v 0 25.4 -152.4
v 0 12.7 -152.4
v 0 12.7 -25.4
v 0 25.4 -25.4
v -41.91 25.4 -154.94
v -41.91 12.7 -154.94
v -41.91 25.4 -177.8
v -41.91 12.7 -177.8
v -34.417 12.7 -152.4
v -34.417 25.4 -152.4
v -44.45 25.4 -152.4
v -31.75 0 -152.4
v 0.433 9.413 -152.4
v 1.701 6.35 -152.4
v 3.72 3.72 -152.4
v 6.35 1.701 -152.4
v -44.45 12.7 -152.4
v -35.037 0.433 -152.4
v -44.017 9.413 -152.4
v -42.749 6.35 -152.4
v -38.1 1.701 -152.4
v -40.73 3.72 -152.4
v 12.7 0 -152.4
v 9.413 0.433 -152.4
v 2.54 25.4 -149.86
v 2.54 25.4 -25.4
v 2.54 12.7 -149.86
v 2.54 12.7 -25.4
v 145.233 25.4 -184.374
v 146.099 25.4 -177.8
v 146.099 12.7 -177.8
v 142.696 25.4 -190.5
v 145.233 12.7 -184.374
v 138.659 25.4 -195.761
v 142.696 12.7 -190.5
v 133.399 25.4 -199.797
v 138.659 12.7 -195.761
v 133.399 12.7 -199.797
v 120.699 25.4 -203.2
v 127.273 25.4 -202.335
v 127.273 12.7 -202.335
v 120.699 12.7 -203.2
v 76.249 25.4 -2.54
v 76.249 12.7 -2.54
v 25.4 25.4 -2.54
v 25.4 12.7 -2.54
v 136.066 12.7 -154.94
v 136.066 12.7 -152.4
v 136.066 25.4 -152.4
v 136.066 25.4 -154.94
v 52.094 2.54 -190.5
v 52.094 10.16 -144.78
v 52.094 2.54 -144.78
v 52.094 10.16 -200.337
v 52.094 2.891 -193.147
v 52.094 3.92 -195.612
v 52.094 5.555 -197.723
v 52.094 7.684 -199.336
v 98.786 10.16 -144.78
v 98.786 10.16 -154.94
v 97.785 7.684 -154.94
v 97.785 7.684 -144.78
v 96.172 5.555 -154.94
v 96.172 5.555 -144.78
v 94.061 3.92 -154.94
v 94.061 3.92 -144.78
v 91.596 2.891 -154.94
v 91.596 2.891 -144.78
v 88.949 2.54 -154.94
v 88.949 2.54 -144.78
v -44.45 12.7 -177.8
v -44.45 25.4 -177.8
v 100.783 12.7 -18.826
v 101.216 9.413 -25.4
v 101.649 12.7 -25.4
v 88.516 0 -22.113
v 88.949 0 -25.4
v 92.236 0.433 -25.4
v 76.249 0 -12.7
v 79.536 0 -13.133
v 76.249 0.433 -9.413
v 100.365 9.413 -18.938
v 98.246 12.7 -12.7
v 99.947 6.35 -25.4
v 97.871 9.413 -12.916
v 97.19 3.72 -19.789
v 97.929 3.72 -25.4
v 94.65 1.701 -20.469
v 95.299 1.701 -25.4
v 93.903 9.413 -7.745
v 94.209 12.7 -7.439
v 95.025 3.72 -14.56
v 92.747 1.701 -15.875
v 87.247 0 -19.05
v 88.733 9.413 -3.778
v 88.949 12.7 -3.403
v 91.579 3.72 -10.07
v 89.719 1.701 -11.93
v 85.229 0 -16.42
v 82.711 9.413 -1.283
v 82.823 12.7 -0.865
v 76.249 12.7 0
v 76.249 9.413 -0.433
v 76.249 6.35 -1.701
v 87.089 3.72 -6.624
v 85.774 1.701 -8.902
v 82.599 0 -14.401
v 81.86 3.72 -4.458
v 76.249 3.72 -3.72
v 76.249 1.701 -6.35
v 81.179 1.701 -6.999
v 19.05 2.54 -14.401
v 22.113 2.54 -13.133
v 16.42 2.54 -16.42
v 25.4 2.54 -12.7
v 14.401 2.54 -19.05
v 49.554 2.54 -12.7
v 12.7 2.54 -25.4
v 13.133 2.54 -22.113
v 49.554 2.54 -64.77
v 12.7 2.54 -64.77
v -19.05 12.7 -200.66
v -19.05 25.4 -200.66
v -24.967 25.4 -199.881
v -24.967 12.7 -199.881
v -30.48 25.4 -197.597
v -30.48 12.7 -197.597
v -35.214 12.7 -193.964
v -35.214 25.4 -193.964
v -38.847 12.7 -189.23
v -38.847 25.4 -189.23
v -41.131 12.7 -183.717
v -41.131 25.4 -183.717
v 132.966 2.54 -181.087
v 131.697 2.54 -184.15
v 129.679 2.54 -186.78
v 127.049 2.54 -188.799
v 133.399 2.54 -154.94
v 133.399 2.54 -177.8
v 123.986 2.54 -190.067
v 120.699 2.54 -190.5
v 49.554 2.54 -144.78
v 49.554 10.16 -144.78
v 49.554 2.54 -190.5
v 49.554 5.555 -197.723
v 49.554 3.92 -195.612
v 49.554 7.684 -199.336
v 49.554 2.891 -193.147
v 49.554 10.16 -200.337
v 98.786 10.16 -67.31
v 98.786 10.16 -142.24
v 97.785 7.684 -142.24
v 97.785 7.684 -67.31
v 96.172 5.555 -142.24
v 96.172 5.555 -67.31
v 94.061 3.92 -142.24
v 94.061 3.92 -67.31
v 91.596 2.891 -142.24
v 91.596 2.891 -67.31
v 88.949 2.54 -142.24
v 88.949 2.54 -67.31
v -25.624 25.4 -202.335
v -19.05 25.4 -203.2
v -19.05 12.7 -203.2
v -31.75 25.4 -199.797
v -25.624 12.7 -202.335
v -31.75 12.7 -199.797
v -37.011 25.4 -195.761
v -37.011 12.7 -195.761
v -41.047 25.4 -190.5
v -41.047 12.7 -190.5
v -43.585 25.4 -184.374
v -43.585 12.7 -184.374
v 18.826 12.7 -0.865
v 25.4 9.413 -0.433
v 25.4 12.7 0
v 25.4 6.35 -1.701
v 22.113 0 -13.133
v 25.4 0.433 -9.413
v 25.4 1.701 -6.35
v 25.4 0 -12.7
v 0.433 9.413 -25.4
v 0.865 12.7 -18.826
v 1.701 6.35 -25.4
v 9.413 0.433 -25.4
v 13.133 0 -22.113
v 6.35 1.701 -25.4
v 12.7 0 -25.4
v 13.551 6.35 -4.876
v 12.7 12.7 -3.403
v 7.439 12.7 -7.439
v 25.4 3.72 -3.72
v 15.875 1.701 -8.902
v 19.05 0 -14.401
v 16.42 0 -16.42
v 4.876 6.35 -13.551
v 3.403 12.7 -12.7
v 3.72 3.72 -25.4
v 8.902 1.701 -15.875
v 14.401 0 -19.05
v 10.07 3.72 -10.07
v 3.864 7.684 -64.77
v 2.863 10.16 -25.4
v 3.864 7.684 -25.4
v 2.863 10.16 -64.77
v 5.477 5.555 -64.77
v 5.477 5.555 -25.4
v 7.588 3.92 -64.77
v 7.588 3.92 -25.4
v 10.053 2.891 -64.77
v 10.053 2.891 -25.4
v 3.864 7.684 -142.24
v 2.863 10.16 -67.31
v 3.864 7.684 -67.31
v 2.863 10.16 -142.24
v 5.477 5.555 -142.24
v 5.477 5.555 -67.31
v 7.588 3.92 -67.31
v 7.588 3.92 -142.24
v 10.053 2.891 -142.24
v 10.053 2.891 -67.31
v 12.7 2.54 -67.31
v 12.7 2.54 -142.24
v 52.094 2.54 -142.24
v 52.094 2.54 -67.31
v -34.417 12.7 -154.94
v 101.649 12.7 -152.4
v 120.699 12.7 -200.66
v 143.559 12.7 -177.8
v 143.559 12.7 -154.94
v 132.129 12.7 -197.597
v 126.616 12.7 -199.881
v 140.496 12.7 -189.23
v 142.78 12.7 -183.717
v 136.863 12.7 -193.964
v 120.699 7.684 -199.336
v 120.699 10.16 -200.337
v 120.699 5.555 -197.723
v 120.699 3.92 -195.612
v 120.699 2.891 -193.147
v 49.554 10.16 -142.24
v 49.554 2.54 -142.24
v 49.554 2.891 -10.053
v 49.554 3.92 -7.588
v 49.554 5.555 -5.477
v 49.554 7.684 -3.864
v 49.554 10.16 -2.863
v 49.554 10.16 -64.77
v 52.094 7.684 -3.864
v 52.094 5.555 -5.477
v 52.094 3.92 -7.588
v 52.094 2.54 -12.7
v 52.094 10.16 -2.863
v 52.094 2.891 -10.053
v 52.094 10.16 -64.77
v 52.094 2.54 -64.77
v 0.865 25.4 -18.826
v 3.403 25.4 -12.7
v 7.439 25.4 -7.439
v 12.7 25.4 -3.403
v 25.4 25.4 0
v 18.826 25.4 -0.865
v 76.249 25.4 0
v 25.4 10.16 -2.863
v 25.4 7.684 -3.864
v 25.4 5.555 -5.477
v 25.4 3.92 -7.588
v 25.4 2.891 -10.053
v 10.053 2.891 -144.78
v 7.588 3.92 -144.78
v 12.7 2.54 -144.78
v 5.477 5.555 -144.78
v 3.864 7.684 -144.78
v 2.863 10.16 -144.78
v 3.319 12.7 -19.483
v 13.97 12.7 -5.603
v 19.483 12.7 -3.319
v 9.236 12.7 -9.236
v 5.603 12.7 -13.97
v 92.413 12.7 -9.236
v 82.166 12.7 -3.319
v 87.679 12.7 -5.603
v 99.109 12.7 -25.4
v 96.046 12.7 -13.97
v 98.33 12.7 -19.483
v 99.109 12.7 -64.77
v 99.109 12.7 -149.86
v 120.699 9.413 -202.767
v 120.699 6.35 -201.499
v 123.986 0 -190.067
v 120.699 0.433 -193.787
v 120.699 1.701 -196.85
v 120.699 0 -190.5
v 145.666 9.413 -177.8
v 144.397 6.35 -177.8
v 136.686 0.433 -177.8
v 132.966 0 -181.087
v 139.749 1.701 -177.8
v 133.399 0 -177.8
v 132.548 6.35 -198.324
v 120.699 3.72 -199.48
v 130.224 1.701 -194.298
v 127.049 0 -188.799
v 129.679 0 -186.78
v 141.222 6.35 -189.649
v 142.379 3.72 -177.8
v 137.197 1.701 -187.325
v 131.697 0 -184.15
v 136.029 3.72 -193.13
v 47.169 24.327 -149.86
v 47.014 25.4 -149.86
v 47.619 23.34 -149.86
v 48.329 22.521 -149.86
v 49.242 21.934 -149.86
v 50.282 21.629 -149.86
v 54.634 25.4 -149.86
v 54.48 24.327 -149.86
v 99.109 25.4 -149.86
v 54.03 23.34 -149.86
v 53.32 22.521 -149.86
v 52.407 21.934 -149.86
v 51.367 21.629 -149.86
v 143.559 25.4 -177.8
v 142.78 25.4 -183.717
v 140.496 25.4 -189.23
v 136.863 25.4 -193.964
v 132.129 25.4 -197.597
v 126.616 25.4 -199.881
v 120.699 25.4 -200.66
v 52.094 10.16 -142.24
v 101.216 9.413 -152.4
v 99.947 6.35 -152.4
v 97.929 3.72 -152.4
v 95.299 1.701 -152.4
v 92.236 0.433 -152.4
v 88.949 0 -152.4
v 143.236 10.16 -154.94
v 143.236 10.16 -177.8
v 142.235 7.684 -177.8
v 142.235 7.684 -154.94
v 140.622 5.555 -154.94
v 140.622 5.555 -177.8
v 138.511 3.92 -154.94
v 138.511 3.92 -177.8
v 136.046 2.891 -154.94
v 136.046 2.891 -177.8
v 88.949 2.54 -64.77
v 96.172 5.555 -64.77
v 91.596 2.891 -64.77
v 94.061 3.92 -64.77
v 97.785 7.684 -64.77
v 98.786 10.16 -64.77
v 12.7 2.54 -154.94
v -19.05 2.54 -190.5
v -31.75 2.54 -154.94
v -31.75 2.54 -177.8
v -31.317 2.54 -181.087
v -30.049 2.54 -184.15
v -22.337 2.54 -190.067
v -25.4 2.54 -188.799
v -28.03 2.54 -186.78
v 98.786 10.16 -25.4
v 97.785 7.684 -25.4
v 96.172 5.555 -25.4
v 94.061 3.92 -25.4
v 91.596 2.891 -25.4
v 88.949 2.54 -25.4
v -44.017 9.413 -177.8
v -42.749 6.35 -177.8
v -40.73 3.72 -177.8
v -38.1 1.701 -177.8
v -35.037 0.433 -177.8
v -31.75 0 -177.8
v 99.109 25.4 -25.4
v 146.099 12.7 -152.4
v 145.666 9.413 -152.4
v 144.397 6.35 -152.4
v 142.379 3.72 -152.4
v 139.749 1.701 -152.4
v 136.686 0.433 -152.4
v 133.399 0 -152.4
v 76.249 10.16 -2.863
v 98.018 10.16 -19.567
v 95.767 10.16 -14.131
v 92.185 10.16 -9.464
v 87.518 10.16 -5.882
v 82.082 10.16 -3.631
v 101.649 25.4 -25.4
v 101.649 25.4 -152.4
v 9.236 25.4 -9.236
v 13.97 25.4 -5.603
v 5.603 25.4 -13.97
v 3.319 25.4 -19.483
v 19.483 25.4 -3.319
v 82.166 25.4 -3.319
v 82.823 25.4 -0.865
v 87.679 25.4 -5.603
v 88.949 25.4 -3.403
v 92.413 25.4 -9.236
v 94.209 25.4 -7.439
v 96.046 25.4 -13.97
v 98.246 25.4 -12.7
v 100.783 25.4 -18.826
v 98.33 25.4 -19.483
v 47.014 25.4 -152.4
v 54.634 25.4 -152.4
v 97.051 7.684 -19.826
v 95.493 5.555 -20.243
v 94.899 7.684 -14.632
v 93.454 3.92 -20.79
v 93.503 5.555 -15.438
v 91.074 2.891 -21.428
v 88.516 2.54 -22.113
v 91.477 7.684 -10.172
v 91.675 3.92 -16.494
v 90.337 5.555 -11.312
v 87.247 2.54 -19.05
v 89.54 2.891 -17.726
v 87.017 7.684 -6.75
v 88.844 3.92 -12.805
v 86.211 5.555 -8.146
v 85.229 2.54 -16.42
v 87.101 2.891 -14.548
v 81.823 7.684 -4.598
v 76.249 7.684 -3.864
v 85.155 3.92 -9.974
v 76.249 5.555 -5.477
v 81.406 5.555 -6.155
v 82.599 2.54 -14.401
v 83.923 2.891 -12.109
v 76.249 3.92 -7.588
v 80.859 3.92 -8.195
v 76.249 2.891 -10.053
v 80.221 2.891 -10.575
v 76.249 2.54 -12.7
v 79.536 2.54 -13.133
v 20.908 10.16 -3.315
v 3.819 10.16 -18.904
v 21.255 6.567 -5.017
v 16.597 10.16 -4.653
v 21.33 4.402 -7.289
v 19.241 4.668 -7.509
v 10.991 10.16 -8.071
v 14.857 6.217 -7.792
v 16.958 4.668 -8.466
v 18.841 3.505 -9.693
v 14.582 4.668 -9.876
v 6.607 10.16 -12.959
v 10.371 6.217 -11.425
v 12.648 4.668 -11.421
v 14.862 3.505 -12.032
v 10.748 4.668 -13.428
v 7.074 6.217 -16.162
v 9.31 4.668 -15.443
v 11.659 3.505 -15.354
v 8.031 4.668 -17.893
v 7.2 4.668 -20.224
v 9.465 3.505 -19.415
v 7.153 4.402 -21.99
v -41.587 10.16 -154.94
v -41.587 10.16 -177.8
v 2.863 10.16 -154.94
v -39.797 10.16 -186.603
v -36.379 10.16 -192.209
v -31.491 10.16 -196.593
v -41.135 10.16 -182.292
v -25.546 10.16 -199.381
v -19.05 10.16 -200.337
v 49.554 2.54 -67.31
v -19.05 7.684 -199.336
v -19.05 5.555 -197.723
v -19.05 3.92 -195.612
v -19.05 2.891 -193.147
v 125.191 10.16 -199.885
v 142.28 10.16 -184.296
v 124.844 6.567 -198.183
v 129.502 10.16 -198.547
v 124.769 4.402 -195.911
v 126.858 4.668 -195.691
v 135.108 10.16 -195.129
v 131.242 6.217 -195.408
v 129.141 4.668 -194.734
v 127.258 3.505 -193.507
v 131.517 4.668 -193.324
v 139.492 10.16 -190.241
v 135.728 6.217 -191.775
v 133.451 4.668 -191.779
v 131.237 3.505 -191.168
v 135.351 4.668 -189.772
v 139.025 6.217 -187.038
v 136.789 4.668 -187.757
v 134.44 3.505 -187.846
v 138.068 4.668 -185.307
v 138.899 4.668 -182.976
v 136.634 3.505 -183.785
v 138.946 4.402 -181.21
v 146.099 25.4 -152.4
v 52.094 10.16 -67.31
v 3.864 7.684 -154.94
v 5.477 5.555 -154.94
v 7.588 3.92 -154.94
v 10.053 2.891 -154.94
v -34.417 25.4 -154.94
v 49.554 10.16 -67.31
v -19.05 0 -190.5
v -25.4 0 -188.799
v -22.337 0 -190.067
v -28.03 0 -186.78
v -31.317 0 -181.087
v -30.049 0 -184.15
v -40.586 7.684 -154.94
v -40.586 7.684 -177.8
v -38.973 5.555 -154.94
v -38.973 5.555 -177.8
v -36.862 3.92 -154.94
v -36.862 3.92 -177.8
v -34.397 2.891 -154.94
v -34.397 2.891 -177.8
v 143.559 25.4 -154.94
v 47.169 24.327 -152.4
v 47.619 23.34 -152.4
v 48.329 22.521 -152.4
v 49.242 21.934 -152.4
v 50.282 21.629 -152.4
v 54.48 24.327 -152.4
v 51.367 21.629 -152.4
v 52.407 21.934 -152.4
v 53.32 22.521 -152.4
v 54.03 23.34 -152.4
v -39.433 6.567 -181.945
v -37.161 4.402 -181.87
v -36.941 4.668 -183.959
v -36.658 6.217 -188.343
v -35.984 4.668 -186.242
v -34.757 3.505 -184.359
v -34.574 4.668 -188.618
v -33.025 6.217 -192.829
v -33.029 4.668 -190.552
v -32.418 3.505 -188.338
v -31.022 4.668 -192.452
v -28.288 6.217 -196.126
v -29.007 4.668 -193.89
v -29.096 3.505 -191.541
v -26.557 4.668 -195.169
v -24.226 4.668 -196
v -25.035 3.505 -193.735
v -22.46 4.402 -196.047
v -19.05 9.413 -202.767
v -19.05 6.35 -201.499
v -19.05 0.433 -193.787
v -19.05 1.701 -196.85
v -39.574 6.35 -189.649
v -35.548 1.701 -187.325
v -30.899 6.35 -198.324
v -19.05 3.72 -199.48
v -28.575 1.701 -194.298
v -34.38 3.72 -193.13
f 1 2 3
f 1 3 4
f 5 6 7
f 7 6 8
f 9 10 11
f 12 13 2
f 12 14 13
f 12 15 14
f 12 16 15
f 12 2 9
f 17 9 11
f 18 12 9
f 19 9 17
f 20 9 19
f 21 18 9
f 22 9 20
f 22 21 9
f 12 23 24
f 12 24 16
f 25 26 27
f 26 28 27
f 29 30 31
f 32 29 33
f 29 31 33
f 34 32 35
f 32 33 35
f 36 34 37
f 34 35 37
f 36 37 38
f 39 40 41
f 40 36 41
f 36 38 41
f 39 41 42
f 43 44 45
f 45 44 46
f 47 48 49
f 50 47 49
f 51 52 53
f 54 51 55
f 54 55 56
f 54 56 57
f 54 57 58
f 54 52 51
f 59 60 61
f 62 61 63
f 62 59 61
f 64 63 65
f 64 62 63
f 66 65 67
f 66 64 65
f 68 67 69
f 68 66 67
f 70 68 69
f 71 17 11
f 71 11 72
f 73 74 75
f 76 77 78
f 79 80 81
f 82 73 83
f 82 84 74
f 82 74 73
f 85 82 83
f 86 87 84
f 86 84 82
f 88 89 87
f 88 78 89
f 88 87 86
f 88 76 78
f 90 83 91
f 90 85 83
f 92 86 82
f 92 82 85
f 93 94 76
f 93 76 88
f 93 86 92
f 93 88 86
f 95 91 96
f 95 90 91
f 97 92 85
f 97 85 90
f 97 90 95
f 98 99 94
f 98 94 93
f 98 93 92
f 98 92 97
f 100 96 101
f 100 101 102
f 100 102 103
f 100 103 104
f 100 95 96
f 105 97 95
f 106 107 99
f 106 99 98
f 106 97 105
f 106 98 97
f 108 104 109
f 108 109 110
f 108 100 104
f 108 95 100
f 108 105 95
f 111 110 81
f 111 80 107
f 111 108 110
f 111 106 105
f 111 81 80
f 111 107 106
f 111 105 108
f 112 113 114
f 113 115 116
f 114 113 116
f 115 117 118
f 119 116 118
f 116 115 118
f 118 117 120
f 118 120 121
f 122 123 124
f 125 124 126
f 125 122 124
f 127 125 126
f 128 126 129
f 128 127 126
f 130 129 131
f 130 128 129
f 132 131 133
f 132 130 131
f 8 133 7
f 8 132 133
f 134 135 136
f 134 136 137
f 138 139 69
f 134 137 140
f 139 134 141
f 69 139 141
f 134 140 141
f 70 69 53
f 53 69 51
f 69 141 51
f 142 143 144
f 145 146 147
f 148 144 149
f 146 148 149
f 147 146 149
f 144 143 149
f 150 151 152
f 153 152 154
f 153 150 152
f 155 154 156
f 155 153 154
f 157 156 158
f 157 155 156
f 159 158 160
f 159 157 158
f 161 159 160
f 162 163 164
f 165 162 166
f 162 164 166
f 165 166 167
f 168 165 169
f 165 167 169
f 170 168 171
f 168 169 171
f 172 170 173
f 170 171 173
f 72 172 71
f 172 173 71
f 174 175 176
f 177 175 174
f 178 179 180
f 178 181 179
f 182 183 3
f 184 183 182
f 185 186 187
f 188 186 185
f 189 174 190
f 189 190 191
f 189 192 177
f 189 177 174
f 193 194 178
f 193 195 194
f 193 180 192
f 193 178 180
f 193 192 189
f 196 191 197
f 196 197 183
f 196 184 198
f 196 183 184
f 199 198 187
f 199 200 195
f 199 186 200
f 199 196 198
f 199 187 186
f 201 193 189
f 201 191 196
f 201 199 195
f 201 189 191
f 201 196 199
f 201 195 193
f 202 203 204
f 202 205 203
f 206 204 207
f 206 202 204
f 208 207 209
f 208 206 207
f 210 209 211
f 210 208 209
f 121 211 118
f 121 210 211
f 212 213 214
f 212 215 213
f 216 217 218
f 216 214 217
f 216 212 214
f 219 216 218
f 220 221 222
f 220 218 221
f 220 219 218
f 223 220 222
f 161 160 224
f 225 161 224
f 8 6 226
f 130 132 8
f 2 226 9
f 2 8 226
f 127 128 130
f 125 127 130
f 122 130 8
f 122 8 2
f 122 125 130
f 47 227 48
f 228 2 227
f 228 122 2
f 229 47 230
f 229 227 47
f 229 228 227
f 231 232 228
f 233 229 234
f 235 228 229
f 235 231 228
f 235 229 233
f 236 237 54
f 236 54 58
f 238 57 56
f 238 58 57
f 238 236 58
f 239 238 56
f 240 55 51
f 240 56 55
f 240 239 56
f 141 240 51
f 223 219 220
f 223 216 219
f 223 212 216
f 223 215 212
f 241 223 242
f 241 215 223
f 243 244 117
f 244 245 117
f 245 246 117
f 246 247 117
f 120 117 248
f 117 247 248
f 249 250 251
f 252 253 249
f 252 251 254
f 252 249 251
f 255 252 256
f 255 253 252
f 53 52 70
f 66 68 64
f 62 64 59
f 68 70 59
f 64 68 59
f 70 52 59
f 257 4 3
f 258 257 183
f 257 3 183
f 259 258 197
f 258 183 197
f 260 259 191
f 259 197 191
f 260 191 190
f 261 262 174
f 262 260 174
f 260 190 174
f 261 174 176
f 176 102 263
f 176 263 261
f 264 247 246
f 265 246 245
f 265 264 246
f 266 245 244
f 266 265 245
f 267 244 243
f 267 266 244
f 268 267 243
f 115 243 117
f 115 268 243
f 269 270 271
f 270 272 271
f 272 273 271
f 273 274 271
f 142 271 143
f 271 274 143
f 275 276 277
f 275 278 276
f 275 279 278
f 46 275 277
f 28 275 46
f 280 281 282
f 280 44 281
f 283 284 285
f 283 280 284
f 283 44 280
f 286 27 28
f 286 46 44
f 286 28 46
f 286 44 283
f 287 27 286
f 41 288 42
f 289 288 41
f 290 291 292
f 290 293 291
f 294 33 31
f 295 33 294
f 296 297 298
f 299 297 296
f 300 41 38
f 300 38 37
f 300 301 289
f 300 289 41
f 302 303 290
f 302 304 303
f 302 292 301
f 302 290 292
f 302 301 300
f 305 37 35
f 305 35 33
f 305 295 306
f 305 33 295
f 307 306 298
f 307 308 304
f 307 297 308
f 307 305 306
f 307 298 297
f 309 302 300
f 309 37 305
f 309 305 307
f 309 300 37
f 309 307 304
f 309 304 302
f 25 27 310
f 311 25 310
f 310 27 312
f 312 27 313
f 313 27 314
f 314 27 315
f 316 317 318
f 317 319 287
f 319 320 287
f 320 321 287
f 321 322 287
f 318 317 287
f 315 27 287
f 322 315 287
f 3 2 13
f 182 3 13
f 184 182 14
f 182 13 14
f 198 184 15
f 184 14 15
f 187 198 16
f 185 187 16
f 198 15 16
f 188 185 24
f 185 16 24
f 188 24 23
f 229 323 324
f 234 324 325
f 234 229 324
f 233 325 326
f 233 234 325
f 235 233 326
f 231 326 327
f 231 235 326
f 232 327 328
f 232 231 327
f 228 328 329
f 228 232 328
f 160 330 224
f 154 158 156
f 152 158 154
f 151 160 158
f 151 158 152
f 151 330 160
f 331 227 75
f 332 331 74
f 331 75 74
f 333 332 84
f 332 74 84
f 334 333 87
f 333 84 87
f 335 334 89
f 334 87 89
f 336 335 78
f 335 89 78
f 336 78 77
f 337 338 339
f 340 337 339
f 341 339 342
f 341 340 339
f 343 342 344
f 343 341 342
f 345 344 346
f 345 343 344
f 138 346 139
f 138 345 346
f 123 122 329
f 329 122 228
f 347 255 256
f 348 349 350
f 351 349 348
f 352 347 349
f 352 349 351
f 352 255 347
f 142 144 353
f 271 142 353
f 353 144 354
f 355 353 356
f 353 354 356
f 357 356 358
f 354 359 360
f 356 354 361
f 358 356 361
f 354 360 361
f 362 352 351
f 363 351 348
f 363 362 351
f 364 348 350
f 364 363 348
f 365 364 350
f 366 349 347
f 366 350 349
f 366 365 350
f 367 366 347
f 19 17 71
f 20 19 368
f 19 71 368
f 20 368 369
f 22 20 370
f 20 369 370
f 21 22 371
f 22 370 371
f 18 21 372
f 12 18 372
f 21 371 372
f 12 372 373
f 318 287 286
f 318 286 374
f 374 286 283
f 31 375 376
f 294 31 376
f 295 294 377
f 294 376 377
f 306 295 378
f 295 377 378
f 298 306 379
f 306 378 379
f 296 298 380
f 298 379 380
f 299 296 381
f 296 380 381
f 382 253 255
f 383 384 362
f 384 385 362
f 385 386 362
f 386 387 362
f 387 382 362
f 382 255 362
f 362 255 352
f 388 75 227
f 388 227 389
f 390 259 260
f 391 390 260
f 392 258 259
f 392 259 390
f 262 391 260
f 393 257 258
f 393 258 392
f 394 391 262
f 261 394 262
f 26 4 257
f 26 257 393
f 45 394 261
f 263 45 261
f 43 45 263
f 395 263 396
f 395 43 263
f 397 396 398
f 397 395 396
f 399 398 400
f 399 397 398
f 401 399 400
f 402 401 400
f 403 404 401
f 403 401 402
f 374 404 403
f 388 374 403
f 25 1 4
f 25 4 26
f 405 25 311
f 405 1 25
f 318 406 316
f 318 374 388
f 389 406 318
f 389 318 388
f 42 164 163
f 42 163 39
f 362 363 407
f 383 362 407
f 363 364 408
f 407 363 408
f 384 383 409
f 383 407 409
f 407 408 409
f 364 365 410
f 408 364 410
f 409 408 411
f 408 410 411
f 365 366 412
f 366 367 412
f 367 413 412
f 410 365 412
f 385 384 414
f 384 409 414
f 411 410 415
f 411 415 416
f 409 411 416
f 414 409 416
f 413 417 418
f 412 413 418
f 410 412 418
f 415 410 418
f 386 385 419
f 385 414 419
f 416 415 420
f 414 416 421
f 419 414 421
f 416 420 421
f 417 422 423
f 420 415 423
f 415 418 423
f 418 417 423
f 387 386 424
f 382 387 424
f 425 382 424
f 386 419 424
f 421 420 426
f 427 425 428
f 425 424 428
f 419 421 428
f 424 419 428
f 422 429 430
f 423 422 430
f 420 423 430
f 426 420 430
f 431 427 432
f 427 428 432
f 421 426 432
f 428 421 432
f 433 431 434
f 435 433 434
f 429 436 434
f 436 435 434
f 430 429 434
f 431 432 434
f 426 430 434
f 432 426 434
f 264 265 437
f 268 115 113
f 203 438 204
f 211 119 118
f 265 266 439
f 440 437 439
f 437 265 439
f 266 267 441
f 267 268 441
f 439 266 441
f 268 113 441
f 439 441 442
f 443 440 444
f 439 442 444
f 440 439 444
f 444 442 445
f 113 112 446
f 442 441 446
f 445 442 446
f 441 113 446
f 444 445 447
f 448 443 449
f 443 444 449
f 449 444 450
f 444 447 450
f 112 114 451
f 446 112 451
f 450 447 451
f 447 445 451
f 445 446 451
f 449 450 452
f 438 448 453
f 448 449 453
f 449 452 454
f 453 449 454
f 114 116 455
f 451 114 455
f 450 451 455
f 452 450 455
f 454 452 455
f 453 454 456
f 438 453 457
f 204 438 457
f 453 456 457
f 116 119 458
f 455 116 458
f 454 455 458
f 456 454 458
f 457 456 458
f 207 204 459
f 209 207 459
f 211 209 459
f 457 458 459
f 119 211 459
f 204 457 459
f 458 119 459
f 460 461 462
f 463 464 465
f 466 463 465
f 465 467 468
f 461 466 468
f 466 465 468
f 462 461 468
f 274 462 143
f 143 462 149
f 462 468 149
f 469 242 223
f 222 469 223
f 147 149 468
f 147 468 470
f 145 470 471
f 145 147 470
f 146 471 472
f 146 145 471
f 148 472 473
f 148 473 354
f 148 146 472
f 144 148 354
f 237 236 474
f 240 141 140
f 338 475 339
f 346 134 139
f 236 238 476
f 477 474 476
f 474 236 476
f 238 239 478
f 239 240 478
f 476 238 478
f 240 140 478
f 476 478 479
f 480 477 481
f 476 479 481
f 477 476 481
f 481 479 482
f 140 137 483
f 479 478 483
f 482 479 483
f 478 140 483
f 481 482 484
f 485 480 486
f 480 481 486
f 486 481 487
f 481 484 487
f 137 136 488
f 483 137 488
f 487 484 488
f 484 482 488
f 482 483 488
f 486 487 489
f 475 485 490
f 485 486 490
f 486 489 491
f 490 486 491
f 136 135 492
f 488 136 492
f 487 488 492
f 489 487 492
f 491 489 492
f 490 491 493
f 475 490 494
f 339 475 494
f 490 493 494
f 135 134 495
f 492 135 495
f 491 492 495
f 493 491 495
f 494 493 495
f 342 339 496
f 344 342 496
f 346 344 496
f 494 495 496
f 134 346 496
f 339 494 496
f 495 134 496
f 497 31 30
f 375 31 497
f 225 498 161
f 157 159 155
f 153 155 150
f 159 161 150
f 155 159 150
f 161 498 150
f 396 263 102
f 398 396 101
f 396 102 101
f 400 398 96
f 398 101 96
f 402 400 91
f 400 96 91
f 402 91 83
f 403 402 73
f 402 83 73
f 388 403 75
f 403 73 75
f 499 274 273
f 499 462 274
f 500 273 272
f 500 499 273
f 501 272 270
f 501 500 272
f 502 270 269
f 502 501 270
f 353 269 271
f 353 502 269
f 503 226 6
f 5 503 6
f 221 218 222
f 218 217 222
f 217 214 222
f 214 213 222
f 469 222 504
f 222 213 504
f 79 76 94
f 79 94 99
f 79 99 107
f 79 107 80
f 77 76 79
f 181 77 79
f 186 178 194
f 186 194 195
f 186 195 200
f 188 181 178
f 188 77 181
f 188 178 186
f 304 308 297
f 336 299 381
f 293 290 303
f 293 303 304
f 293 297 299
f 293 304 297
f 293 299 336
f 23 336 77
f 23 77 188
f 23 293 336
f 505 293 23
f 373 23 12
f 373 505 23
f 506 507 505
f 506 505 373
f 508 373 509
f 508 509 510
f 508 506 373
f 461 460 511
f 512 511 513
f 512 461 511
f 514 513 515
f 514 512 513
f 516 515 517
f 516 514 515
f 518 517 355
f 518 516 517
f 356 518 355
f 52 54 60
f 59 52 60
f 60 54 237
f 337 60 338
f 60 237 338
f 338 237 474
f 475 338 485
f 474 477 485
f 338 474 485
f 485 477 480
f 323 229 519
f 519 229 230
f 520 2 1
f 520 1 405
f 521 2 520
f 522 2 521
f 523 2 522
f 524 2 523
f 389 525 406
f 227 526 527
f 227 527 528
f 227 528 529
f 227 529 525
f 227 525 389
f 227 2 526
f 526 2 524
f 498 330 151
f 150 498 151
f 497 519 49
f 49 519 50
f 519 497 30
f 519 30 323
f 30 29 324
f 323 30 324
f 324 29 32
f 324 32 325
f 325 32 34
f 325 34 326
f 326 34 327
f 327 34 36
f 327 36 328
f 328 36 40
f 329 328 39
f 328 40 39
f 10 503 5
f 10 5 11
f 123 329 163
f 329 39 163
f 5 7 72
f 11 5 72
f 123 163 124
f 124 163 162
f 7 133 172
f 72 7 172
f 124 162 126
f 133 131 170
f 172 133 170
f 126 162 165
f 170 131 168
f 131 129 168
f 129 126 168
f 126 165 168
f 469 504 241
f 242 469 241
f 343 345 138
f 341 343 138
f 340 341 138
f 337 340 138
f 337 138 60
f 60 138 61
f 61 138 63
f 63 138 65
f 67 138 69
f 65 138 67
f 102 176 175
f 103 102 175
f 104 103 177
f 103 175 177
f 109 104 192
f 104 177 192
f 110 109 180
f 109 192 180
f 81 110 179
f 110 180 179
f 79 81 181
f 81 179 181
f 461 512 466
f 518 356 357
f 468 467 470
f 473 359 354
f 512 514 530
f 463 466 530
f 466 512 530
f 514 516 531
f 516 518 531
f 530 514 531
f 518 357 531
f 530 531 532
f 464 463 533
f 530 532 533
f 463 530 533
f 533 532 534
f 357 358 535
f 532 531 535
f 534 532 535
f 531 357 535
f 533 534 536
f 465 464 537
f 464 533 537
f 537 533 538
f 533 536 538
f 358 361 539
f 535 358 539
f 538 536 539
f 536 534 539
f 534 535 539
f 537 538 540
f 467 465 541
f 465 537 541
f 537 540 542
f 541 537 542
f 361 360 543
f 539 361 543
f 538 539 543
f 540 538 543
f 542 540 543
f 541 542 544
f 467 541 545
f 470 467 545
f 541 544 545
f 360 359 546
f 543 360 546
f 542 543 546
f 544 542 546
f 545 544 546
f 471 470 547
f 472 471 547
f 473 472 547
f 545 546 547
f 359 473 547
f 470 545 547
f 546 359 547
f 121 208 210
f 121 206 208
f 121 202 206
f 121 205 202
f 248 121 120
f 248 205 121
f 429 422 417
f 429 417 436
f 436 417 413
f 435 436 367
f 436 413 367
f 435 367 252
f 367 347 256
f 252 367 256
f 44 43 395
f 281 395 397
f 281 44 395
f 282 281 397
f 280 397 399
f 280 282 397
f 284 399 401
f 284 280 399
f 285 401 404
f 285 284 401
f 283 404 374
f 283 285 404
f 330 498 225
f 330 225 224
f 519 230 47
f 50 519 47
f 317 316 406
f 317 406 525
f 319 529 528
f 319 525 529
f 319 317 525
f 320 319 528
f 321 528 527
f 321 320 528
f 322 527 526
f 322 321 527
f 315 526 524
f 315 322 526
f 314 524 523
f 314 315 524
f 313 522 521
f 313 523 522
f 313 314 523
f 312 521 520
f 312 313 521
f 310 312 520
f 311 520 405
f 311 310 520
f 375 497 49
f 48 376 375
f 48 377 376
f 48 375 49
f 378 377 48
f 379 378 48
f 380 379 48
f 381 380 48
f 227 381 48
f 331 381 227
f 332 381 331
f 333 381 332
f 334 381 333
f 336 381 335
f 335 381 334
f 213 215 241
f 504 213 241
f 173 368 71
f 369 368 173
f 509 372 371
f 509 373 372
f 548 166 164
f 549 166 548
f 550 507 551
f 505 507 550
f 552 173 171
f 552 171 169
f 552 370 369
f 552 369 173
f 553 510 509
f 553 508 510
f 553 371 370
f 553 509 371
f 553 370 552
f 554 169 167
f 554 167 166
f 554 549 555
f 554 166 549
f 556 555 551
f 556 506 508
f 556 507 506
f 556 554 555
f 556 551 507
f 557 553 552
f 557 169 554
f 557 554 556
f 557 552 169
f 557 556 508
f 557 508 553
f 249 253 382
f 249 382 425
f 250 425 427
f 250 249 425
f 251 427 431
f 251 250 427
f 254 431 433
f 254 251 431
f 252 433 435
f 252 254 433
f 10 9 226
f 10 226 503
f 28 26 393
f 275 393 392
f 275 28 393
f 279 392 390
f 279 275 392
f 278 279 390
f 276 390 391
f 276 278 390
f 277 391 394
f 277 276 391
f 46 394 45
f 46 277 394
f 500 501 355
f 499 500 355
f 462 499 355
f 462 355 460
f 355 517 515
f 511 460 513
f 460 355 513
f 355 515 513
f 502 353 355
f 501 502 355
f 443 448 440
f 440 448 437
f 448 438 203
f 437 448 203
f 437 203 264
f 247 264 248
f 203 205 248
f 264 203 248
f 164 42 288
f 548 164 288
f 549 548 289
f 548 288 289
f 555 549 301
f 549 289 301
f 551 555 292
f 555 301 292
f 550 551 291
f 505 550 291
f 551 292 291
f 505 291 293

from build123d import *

# Parameters (mm, degrees)
BOSS_EXTRUDE1_DEPTH  = 25.4
FILLET1_R            = 12.7
FILLET3_R            = 25.4
FILLET4_R            = 25.4
FILLET5_R            = 25.4
SHELL1_T             = -2.54
EXTRUDE_THIN1_REACH  = 252.592
SKETCH2_W            = 2.54
SKETCH2_H            = 198.12
EXTRUDE_THIN4_REACH  = 252.592
SKETCH3_W            = 47.014483258
SKETCH3_H            = 2.54
SKETCH3_W_2          = 47.014483257
EXTRUDE_THIN5_REACH  = 252.592
SKETCH5_W            = 47.014483258
SKETCH5_H            = 2.54
SKETCH5_W_2          = 47.014483257
EXTRUDE_THIN10_START = 10.16
EXTRUDE_THIN10_DEPTH = 2.54
EXTRUDE_THIN11_START = 10.16
EXTRUDE_THIN11_DEPTH = 2.54
CUT_EXTRUDE2_REACH   = 214.64
SKETCH11_W           = 34.417
SKETCH11_H           = 12.7
CUT_EXTRUDE3_REACH   = 253.556
SKETCH12_W           = 2.54
SKETCH12_H           = 12.7
CUT_EXTRUDE4_REACH   = 253.556
SKETCH13_W           = 2.54
SKETCH13_H           = 12.7
SKETCH14_W           = 96.568966515
SKETCH14_H           = 2.54
EXTRUDE_THIN13_DEPTH = 12.7
CUT_EXTRUDE6_REACH   = 212.827


with BuildPart() as part:
    # Sketch1 → Boss-Extrude1 (new body)
    with BuildSketch(Plane(origin=(0, 0, 0), x_dir=(1, 0, 0), z_dir=(0, 1, 0))):
        Polygon((0, 0), (0, 152.4), (-44.45, 152.4), (-44.45, 203.2), (146.098966515, 203.2), (146.098966515, 152.4), (101.648966515, 152.4), (101.648966515, 0), align=None)
    extrude(amount=BOSS_EXTRUDE1_DEPTH)

    # Fillet1
    fillet1_edges = [part.edges().sort_by_distance(p)[0] for p in [
        (146.098966515, 0, -177.8),
        (101.648966515, 0, -76.2),
        (50.824483258, 0, 0),
        (0, 0, -76.2),
        (-44.45, 0, -177.8),
        (50.824483258, 0, -203.2),
    ]]
    fillet(fillet1_edges, radius=FILLET1_R)

    # Fillet3
    # the kernel refuses this fillet: 25.4 mm, written as the material it takes off along each edge
    with BuildSketch(Plane(origin=(76.248966515, 0, -25.4), x_dir=(1, 0, 0), z_dir=(0, 0, -1))) as fillet3_piece_1:
        with BuildLine():
            CenterArc((12.7, -12.7), 12.7, 0, 90)
            Line((25.4, -12.7), (25.4, 0))
            Line((25.4, 0), (12.7, 0))
        make_face()
    revolve(axis=Axis((76.248966515, 0, -25.4), (0, -1, 0)), revolution_arc=90, mode=Mode.SUBTRACT)
    with BuildSketch(Plane(origin=(101.648966515, 0, 0), x_dir=(0, 0, -1), z_dir=(0, 1, 0))) as fillet3_piece_2:
        with BuildLine():
            CenterArc((FILLET3_R, FILLET3_R), FILLET3_R, 180, 90)
            Line((0, FILLET3_R), (0, 0))
            Line((0, 0), (FILLET3_R, 0))
        make_face()
    extrude(amount=88.9, mode=Mode.SUBTRACT)

    # Fillet4
    # the kernel refuses this fillet: 25.4 mm, written as the material it takes off along each edge
    with BuildSketch(Plane(origin=(25.4, 0, -25.4), x_dir=(0, 0, 1), z_dir=(1, 0, 0))) as fillet4_piece_1:
        with BuildLine():
            CenterArc((12.7, -12.7), 12.7, 0, 90)
            Line((25.4, -12.7), (25.4, 0))
            Line((25.4, 0), (12.7, 0))
        make_face()
    revolve(axis=Axis((25.4, 0, -25.4), (0, -1, 0)), revolution_arc=90, mode=Mode.SUBTRACT)
    with BuildSketch(Plane(origin=(0, 0, 0), x_dir=(0, 0, -1), z_dir=(0, 1, 0))) as fillet4_piece_2:
        with BuildLine():
            CenterArc((FILLET4_R, -FILLET4_R), FILLET4_R, 90, 90)
            Line((0, -FILLET4_R), (0, 0))
            Line((0, 0), (FILLET4_R, 0))
        make_face()
    extrude(amount=88.9, mode=Mode.SUBTRACT)

    # Fillet5
    # the kernel refuses this fillet: 25.4 mm, written as the material it takes off along each edge
    with BuildSketch(Plane(origin=(120.698966515, 0, -177.8), x_dir=(0, 0, -1), z_dir=(-1, 0, 0))) as fillet5_piece_1:
        with BuildLine():
            CenterArc((12.7, -12.7), 12.7, 0, 90)
            Line((25.4, -12.7), (25.4, 0))
            Line((25.4, 0), (12.7, 0))
        make_face()
    revolve(axis=Axis((120.698966515, 0, -177.8), (0, -1, 0)), revolution_arc=90, mode=Mode.SUBTRACT)
    with BuildSketch(Plane(origin=(-19.05, 0, -177.8), x_dir=(-1, 0, 0), z_dir=(0, 0, 1))) as fillet5_piece_2:
        with BuildLine():
            CenterArc((12.7, -12.7), 12.7, 0, 90)
            Line((25.4, -12.7), (25.4, 0))
            Line((25.4, 0), (12.7, 0))
        make_face()
    revolve(axis=Axis((-19.05, 0, -177.8), (0, -1, 0)), revolution_arc=90, mode=Mode.SUBTRACT)
    with BuildSketch(Plane(origin=(-44.45, 0, -203.2), x_dir=(0, 0, 1), z_dir=(0, 1, 0))) as fillet5_piece_3:
        with BuildLine():
            CenterArc((FILLET5_R, FILLET5_R), FILLET5_R, 180, 90)
            Line((0, FILLET5_R), (0, 0))
            Line((0, 0), (FILLET5_R, 0))
        make_face()
    extrude(amount=88.9, mode=Mode.SUBTRACT)
    with BuildSketch(Plane(origin=(146.098966515, 0, -203.2), x_dir=(0, 0, 1), z_dir=(0, 1, 0))) as fillet5_piece_4:
        with BuildLine():
            CenterArc((FILLET5_R, -FILLET5_R), FILLET5_R, 90, 90)
            Line((0, -FILLET5_R), (0, 0))
            Line((0, 0), (FILLET5_R, 0))
        make_face()
    extrude(amount=88.9, mode=Mode.SUBTRACT)

    # Shell1
    shell1_openings = [part.faces().sort_by_distance(p)[0] for p in [
        (50.824483258, 25.4, -115.579080846),
    ]]
    offset(amount=SHELL1_T, openings=shell1_openings, kind=Kind.INTERSECTION)

    # Sketch2 → Extrude-Thin1 (add, up to next)
    with BuildSketch(Plane(origin=(0, 12.7, 0), x_dir=(1, 0, 0), z_dir=(0, 1, 0)), mode=Mode.PRIVATE) as extrude_thin1_sk1:
        with Locations((50.824483258, 101.6)):
            Rectangle(SKETCH2_W, SKETCH2_H)
    extrude_thin1_tool1 = extrude(extrude_thin1_sk1.sketch, amount=-EXTRUDE_THIN1_REACH, mode=Mode.PRIVATE) - part.part
    add(extrude_thin1_tool1.solids().sort_by_distance((50.824483, 12.7, -101.6))[0])

    # Sketch3 → Extrude-Thin4 (add, up to next)
    with BuildSketch(Plane(origin=(0, 12.7, 0), x_dir=(1, 0, 0), z_dir=(0, 1, 0)), mode=Mode.PRIVATE) as extrude_thin4_sk1:
        with Locations((26.047241629, 66.04)):
            Rectangle(SKETCH3_W, SKETCH3_H)
    extrude_thin4_tool1 = extrude(extrude_thin4_sk1.sketch, amount=-EXTRUDE_THIN4_REACH, mode=Mode.PRIVATE) - part.part
    # Sketch3 → Extrude-Thin4 (add, up to next)
    with BuildSketch(Plane(origin=(0, 12.7, 0), x_dir=(1, 0, 0), z_dir=(0, 1, 0)), mode=Mode.PRIVATE) as extrude_thin4_sk2:
        with Locations((75.601724887, 66.04)):
            Rectangle(SKETCH3_W_2, SKETCH3_H)
    extrude_thin4_tool2 = extrude(extrude_thin4_sk2.sketch, amount=-EXTRUDE_THIN4_REACH, mode=Mode.PRIVATE) - part.part
    add(extrude_thin4_tool1.solids().sort_by_distance((26.047242, 12.7, -66.04))[0])
    add(extrude_thin4_tool2.solids().sort_by_distance((75.601725, 12.7, -66.04))[0])

    # Sketch5 → Extrude-Thin5 (add, up to next)
    with BuildSketch(Plane(origin=(0, 12.7, 0), x_dir=(1, 0, 0), z_dir=(0, 1, 0)), mode=Mode.PRIVATE) as extrude_thin5_sk1:
        with Locations((26.047241629, 143.51)):
            Rectangle(SKETCH5_W, SKETCH5_H)
    extrude_thin5_tool1 = extrude(extrude_thin5_sk1.sketch, amount=-EXTRUDE_THIN5_REACH, mode=Mode.PRIVATE) - part.part
    # Sketch5 → Extrude-Thin5 (add, up to next)
    with BuildSketch(Plane(origin=(0, 12.7, 0), x_dir=(1, 0, 0), z_dir=(0, 1, 0)), mode=Mode.PRIVATE) as extrude_thin5_sk2:
        with Locations((75.601724887, 143.51)):
            Rectangle(SKETCH5_W_2, SKETCH5_H)
    extrude_thin5_tool2 = extrude(extrude_thin5_sk2.sketch, amount=-EXTRUDE_THIN5_REACH, mode=Mode.PRIVATE) - part.part
    add(extrude_thin5_tool1.solids().sort_by_distance((26.047242, 12.7, -143.51))[0])
    add(extrude_thin5_tool2.solids().sort_by_distance((75.601725, 12.7, -143.51))[0])

    # Extrude-Thin10: read off the stored shape, not the designer's step
    # Extrude-Thin10 outline → Extrude-Thin10 (add)
    with BuildSketch(Plane(origin=(0, 0, 0), x_dir=(1, 0, 0), z_dir=(0, 1, 0)).offset(EXTRUDE_THIN10_START)):
        with BuildLine():
            ThreePointArc((2.54, 25.4), (9.235538982, 9.235538982), (25.4, 2.54))
            Line((25.4, 2.54), (52.094483258, 2.54))
            Line((52.094483258, 2.54), (52.094483258, 64.77))
            Line((52.094483258, 64.77), (99.108966515, 64.77))
            Line((99.108966515, 64.77), (99.108966515, 67.31))
            Line((99.108966515, 67.31), (52.094483258, 67.31))
            Line((52.094483258, 67.31), (52.094483258, 142.24))
            Line((52.094483258, 142.24), (99.108966515, 142.24))
            Line((99.108966515, 142.24), (99.108966515, 144.78))
            Line((99.108966515, 144.78), (52.094483258, 144.78))
            Line((52.094483258, 144.78), (52.094483258, 200.66))
            Line((52.094483258, 200.66), (-19.05, 200.66))
            ThreePointArc((-19.05, 200.66), (-35.214461018, 193.964461018), (-41.91, 177.8))
            Line((-41.91, 177.8), (-41.91, 154.94))
            Line((-41.91, 154.94), (2.54, 154.94))
            Line((2.54, 154.94), (2.54, 25.4))
        make_face()
    extrude(amount=EXTRUDE_THIN10_DEPTH)

    # Extrude-Thin11: read off the stored shape, not the designer's step
    # Extrude-Thin11 outline → Extrude-Thin11 (add)
    with BuildSketch(Plane(origin=(0, 0, 0), x_dir=(1, 0, 0), z_dir=(0, 1, 0)).offset(EXTRUDE_THIN11_START)):
        with BuildLine():
            ThreePointArc((2.54, 25.4), (9.235538982, 9.235538982), (25.4, 2.54))
            Line((25.4, 2.54), (76.248966515, 2.54))
            ThreePointArc((76.248966515, 2.54), (92.413427533, 9.235538982), (99.108966515, 25.4))
            Line((99.108966515, 25.4), (99.108966515, 154.94))
            Line((99.108966515, 154.94), (143.558966515, 154.94))
            Line((143.558966515, 154.94), (143.558966515, 177.8))
            ThreePointArc((143.558966515, 177.8), (136.863427533, 193.964461018), (120.698966515, 200.66))
            Line((120.698966515, 200.66), (-19.05, 200.66))
            ThreePointArc((-19.05, 200.66), (-35.214461018, 193.964461018), (-41.91, 177.8))
            Line((-41.91, 177.8), (-41.91, 154.94))
            Line((-41.91, 154.94), (2.54, 154.94))
            Line((2.54, 154.94), (2.54, 25.4))
        make_face()
    extrude(amount=EXTRUDE_THIN11_DEPTH)

    # Sketch11 → Cut-Extrude2 (cut, up to next)
    with BuildSketch(Plane.XY.offset(-152.4), mode=Mode.PRIVATE) as cut_extrude2_sk1:
        with Locations((-17.2085, 19.05)):
            Rectangle(SKETCH11_W, SKETCH11_H)
    cut_extrude2_tool1 = extrude(cut_extrude2_sk1.sketch, amount=-CUT_EXTRUDE2_REACH, mode=Mode.PRIVATE) & part.part
    # Sketch11 → Cut-Extrude2 (cut, up to next)
    with BuildSketch(Plane.XY.offset(-152.4), mode=Mode.PRIVATE) as cut_extrude2_sk2:
        with Locations((118.857466515, 19.05)):
            Rectangle(SKETCH11_W, SKETCH11_H)
    cut_extrude2_tool2 = extrude(cut_extrude2_sk2.sketch, amount=-CUT_EXTRUDE2_REACH, mode=Mode.PRIVATE) & part.part
    add(cut_extrude2_tool1.solids().sort_by_distance((-17.2085, 19.05, -152.4))[0], mode=Mode.SUBTRACT)
    add(cut_extrude2_tool2.solids().sort_by_distance((118.857467, 19.05, -152.4))[0], mode=Mode.SUBTRACT)

    # Sketch12 → Cut-Extrude3 (cut, up to next)
    with BuildSketch(Plane(origin=(101.648966515, 0, 0), x_dir=(0, 0, -1), z_dir=(1, 0, 0)), mode=Mode.PRIVATE) as cut_extrude3_sk1:
        with Locations((153.67, 19.05)):
            Rectangle(SKETCH12_W, SKETCH12_H)
    cut_extrude3_tool1 = extrude(cut_extrude3_sk1.sketch, amount=-CUT_EXTRUDE3_REACH, mode=Mode.PRIVATE) & part.part
    add(cut_extrude3_tool1.solids().sort_by_distance((101.648967, 19.05, -153.67))[0], mode=Mode.SUBTRACT)

    # Sketch13 → Cut-Extrude4 (cut, up to next)
    with BuildSketch(Plane.ZY, mode=Mode.PRIVATE) as cut_extrude4_sk1:
        with Locations((-153.67, 19.05)):
            Rectangle(SKETCH13_W, SKETCH13_H)
    cut_extrude4_tool1 = extrude(cut_extrude4_sk1.sketch, amount=-CUT_EXTRUDE4_REACH, mode=Mode.PRIVATE) & part.part
    add(cut_extrude4_tool1.solids().sort_by_distance((0, 19.05, -153.67))[0], mode=Mode.SUBTRACT)

    # Sketch14 → Extrude-Thin13 (add)
    with BuildSketch(Plane(origin=(0, 12.7, 0), x_dir=(1, 0, 0), z_dir=(0, 1, 0))):
        with Locations((50.824483258, 151.13)):
            Rectangle(SKETCH14_W, SKETCH14_H)
    extrude(amount=EXTRUDE_THIN13_DEPTH)

    # Sketch16 → Cut-Extrude6 (cut, up to next)
    with BuildSketch(Plane.XY.offset(-149.86), mode=Mode.PRIVATE) as cut_extrude6_sk1:
        with BuildLine():
            Line((47.014483258, 25.4), (54.634483258, 25.4))
            ThreePointArc((54.634483258, 25.4), (50.824483258, 21.59), (47.014483258, 25.4))
        make_face()
    cut_extrude6_tool1 = extrude(cut_extrude6_sk1.sketch, amount=-CUT_EXTRUDE6_REACH, mode=Mode.PRIVATE) & part.part
    add(cut_extrude6_tool1.solids().sort_by_distance((50.824483, 23.782986, -149.86))[0], mode=Mode.SUBTRACT)


solid = part.part
